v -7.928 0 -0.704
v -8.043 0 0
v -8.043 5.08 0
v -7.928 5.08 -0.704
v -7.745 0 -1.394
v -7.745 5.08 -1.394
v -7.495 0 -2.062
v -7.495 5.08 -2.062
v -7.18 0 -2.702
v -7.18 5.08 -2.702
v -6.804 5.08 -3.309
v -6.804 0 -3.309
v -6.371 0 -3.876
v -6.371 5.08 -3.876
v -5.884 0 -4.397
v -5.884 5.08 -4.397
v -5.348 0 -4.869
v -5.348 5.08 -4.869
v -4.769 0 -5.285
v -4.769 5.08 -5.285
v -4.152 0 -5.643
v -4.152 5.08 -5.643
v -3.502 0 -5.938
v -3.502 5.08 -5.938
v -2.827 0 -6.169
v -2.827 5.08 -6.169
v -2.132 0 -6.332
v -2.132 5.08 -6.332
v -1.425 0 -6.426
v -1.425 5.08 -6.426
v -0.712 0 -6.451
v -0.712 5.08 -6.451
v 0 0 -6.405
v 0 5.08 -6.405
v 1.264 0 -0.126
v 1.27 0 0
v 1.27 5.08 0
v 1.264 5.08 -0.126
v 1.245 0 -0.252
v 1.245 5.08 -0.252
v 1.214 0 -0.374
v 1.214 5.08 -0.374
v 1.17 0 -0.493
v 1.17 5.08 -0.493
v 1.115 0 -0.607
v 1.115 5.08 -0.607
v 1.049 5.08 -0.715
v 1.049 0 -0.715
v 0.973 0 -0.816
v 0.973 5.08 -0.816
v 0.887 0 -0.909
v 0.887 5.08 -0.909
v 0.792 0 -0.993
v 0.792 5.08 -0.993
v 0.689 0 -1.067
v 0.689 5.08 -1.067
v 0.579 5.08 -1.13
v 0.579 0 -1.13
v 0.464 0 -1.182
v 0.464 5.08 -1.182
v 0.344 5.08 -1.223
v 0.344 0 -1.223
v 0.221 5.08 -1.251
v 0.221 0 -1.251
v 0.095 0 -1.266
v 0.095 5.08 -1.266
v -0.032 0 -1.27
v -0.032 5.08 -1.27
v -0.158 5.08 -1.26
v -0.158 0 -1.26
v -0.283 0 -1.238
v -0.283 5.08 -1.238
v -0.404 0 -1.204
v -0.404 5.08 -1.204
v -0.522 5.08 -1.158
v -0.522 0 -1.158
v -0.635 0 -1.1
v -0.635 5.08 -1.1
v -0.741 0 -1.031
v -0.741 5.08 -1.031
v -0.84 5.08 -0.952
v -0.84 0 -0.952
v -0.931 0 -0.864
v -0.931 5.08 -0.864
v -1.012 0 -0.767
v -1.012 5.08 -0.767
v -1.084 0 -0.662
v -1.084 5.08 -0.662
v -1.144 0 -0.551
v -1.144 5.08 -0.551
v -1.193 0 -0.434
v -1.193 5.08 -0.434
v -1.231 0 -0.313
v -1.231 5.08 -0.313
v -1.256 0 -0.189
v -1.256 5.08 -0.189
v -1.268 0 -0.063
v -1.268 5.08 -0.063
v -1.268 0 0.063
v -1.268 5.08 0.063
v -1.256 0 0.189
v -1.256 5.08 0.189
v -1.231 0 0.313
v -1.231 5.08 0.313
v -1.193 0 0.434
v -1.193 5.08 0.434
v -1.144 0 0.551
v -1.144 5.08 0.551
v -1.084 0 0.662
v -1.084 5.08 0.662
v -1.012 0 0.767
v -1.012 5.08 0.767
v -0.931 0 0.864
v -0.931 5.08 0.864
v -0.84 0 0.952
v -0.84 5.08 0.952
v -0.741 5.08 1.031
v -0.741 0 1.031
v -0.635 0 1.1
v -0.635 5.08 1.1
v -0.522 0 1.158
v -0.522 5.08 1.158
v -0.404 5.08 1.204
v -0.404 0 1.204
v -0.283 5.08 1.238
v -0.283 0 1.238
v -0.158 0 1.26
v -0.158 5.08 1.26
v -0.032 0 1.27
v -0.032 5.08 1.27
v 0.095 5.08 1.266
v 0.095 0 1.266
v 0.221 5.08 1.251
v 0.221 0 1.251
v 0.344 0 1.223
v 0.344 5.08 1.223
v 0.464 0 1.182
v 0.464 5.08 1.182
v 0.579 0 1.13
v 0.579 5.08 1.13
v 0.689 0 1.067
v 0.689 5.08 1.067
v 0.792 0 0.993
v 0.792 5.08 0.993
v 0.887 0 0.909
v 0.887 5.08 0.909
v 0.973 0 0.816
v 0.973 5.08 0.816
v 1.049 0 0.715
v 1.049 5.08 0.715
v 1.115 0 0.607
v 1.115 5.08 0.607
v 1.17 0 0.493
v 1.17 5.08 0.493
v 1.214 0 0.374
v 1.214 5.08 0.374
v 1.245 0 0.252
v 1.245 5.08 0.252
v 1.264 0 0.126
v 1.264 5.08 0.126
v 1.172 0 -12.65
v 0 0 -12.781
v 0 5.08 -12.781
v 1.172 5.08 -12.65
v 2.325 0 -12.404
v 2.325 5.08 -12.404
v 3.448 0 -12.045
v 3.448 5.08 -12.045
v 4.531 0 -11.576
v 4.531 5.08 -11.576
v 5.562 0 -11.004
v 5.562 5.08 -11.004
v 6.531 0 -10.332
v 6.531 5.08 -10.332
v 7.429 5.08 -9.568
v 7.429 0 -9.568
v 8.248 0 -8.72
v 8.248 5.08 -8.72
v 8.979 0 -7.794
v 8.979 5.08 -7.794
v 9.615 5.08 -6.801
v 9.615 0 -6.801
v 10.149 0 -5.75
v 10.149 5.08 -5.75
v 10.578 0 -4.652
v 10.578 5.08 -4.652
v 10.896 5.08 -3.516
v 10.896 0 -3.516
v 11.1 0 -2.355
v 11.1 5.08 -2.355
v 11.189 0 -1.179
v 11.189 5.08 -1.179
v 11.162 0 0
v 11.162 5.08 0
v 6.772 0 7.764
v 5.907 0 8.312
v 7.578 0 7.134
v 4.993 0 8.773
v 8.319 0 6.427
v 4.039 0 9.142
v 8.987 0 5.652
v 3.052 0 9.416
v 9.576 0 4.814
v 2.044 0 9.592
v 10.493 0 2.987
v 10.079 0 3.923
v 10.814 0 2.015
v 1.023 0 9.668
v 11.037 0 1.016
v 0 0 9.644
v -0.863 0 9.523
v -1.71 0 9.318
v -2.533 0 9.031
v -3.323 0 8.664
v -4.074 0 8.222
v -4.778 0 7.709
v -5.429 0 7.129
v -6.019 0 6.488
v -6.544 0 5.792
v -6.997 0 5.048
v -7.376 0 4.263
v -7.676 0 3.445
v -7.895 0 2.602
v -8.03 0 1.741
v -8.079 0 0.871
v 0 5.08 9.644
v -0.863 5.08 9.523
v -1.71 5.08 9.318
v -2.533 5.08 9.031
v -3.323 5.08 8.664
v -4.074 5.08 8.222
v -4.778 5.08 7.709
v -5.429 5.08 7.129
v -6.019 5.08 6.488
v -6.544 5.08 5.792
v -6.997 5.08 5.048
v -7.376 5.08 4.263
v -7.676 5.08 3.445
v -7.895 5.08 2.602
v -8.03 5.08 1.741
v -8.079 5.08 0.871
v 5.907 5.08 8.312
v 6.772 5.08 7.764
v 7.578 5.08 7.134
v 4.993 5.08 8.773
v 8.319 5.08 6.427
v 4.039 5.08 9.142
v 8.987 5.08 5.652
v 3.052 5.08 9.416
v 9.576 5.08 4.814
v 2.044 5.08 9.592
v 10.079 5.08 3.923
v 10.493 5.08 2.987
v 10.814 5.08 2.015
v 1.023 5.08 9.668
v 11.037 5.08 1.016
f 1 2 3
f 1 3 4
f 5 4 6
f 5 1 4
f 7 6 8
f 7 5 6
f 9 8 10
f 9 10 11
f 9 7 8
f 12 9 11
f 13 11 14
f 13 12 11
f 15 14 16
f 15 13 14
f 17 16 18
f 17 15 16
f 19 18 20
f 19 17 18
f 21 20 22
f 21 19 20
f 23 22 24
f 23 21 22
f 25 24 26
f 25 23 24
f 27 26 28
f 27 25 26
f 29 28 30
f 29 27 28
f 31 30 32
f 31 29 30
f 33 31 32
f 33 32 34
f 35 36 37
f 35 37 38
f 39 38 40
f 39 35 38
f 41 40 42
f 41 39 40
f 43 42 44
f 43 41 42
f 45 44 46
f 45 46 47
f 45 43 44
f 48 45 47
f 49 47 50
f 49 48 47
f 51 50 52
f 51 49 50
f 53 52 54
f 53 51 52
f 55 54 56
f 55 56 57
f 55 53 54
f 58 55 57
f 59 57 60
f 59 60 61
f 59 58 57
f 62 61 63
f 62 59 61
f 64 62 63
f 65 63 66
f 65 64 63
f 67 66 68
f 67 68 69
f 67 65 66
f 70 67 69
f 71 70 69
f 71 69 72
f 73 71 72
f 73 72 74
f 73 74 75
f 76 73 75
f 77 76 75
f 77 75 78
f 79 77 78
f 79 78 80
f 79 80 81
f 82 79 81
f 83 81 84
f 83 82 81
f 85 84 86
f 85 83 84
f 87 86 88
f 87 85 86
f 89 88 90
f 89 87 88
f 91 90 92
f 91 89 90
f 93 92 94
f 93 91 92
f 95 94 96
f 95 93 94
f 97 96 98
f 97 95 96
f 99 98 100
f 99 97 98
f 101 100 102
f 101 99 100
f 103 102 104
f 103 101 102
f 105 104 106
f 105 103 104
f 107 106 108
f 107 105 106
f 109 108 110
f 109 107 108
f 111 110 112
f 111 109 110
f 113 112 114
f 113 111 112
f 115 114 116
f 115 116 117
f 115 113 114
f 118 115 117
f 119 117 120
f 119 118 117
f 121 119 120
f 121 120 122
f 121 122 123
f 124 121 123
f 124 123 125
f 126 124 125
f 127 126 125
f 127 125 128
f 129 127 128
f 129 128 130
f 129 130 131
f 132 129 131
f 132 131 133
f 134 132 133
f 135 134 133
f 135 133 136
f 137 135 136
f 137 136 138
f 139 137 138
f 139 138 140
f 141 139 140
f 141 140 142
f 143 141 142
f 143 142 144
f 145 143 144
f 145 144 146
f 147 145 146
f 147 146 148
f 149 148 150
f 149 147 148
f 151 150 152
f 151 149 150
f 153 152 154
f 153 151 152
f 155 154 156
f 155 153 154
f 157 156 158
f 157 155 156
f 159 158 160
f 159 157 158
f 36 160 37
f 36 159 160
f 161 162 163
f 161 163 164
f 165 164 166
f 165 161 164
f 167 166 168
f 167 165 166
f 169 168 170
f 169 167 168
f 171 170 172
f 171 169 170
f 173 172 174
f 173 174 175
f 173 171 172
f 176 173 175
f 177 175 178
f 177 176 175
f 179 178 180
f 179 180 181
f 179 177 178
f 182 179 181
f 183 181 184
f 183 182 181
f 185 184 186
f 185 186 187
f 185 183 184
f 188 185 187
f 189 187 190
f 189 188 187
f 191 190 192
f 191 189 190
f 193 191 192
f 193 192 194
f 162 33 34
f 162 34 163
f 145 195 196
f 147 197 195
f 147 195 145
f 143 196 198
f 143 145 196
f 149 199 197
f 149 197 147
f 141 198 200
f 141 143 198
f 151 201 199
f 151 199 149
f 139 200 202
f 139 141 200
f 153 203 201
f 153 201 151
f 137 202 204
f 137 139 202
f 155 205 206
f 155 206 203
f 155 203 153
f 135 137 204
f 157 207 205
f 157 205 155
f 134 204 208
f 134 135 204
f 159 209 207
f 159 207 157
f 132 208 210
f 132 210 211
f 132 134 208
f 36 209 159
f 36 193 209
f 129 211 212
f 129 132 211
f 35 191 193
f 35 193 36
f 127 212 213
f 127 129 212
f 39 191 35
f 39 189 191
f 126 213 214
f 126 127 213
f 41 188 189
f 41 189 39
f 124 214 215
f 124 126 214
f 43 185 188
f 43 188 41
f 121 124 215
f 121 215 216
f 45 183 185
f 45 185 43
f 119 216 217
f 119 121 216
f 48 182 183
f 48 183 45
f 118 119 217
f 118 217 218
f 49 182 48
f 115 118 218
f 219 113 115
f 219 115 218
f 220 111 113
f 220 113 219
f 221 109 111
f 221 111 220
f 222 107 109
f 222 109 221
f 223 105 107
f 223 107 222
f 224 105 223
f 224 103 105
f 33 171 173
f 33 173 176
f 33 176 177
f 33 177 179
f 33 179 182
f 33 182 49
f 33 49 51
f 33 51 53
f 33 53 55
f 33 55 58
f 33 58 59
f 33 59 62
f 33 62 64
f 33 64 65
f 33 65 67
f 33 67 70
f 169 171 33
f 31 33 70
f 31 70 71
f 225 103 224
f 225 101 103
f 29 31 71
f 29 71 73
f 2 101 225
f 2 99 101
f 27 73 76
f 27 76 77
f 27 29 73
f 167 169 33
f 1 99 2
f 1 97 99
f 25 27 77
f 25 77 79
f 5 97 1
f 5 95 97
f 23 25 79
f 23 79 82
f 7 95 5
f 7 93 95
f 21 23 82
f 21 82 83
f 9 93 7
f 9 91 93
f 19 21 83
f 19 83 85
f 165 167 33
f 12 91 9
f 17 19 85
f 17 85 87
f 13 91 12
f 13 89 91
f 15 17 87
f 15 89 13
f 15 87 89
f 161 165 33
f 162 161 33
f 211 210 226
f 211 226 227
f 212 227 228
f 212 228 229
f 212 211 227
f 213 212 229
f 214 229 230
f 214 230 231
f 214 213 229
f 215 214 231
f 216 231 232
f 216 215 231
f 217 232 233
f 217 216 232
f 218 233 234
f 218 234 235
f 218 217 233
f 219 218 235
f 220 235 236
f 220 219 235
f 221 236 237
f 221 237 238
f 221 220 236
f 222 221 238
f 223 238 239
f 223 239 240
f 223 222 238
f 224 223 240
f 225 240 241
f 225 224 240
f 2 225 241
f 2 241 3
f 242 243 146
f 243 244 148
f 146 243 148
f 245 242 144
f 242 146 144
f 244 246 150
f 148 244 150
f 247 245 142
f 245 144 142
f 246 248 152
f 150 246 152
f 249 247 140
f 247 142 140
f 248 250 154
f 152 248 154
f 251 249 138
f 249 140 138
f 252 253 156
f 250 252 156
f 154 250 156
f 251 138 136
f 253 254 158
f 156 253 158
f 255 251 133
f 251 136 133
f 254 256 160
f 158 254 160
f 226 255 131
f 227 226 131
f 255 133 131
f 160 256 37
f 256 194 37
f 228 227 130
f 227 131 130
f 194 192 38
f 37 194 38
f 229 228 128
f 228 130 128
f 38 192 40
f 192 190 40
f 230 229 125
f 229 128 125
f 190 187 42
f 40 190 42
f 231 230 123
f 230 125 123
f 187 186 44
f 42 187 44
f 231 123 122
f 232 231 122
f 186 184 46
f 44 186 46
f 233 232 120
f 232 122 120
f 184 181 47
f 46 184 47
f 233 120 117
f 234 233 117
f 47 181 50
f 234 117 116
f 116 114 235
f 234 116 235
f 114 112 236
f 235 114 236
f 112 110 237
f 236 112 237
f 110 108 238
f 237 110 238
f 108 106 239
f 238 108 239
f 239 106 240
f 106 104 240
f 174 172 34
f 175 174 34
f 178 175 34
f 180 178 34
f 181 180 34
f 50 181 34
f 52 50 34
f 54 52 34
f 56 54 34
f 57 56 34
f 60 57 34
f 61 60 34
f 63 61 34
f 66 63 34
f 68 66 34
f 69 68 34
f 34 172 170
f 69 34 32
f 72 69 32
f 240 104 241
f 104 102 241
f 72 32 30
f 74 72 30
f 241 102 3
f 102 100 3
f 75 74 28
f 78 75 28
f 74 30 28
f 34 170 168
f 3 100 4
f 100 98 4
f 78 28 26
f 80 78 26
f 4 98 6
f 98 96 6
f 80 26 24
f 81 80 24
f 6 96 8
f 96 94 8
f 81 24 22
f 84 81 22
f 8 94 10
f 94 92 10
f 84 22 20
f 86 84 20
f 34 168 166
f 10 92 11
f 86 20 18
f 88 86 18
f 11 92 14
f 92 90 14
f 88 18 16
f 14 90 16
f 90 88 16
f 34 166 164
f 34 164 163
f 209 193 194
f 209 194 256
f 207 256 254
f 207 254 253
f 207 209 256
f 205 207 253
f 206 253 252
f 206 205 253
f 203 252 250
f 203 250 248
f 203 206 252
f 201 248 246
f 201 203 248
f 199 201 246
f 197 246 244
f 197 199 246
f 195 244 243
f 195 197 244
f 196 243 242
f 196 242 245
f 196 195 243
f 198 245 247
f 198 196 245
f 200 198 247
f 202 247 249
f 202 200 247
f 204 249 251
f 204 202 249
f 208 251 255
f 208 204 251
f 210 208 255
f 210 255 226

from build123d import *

# Parameters (mm, degrees)
SKETCH1_R           = 1.27
BOSS_EXTRUDE5_DEPTH = 5.08


with BuildPart() as part:
    # Sketch1 → Boss-Extrude5 (new body)
    with BuildSketch(Plane(origin=(0, 0, 0), x_dir=(1, 0, 0), z_dir=(0, 1, 0))):
        with BuildLine():
            Line((0, 6.405373718), (0, 12.781326863))
            ThreePointArc((0, 12.781326863), (8.247768787, 8.719637674), (11.161688458, 0))
            ThreePointArc((11.161688458, 0), (7.57811845, -7.133507881), (0, -9.643693024))
            ThreePointArc((0, -9.643693024), (-6.018946269, -6.487677618), (-8.043344095, 0))
            ThreePointArc((-8.043344095, 0), (-5.348268381, 4.868517964), (0, 6.405373718))
        make_face()
        Circle(SKETCH1_R, mode=Mode.SUBTRACT)
    extrude(amount=BOSS_EXTRUDE5_DEPTH)


solid = part.part
